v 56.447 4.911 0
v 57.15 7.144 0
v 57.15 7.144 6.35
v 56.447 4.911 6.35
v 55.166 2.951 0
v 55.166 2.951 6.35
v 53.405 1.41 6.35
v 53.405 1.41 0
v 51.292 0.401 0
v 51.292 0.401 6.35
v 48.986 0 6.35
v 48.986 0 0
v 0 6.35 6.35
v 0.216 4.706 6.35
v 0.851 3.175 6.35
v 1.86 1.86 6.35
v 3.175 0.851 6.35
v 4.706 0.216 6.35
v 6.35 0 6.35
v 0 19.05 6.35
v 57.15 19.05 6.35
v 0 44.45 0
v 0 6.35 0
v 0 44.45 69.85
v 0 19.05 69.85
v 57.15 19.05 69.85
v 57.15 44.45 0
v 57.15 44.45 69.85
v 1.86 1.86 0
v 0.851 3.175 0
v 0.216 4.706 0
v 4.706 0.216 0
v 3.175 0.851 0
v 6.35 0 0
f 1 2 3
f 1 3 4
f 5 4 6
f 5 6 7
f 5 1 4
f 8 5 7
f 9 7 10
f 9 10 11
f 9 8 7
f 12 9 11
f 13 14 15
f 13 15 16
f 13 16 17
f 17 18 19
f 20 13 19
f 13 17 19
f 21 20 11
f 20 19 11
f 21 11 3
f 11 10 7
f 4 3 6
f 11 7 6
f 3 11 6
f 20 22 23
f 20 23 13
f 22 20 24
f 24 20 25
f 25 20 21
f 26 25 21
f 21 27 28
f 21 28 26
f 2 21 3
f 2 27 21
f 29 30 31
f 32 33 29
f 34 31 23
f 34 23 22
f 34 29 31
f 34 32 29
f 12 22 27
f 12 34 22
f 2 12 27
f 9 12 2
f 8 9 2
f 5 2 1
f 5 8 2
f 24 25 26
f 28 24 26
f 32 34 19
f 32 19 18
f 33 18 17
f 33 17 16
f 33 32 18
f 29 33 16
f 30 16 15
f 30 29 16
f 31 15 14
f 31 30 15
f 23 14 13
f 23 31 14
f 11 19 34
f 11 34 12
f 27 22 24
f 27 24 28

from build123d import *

# Parameters (mm, degrees)
F0_W     = 69.85
F0_H     = 69.85
F1_DEPTH = 44.45
F2_W     = 69.85
F2_H     = 63.5
F3_DEPTH = 19.05
F5_DEPTH = 69.85
F7_DEPTH = 25.4


with BuildPart() as f1:
    # F0 (on Front) → F1 (new body)
    with BuildSketch(Plane.XZ):
        with Locations((34.925, 34.925)):
            Rectangle(F0_W, F0_H)
    extrude(amount=-F1_DEPTH)

    # F2 (on face) → F3 (cut)
    with BuildSketch(Plane.XZ):
        with Locations((34.925, 38.1)):
            Rectangle(F2_W, F2_H)
    extrude(amount=-F3_DEPTH, mode=Mode.SUBTRACT)

    # F4 (on Top) → F5 (cut)
    with BuildSketch(Plane.XY):
        with BuildLine():
            ThreePointArc((57.15, 7.143745), (54.338231, 2.119989), (48.985679, 0))
            Line((48.985679, 0), (69.85, 0))
            Line((69.85, 0), (69.85, 44.45))
            Line((69.85, 44.45), (57.15, 44.45))
            Line((57.15, 44.45), (57.15, 7.143745))
        make_face()
    extrude(amount=F5_DEPTH, mode=Mode.SUBTRACT)

    # F6 (on Top) → F7 (cut)
    with BuildSketch(Plane.XY):
        with BuildLine():
            ThreePointArc((6.35, 0), (1.859872, 1.859872), (0, 6.35))
            Line((0, 6.35), (0, 0))
            Line((0, 0), (6.35, 0))
        make_face()
    extrude(amount=F7_DEPTH, mode=Mode.SUBTRACT)


solid = f1.part
